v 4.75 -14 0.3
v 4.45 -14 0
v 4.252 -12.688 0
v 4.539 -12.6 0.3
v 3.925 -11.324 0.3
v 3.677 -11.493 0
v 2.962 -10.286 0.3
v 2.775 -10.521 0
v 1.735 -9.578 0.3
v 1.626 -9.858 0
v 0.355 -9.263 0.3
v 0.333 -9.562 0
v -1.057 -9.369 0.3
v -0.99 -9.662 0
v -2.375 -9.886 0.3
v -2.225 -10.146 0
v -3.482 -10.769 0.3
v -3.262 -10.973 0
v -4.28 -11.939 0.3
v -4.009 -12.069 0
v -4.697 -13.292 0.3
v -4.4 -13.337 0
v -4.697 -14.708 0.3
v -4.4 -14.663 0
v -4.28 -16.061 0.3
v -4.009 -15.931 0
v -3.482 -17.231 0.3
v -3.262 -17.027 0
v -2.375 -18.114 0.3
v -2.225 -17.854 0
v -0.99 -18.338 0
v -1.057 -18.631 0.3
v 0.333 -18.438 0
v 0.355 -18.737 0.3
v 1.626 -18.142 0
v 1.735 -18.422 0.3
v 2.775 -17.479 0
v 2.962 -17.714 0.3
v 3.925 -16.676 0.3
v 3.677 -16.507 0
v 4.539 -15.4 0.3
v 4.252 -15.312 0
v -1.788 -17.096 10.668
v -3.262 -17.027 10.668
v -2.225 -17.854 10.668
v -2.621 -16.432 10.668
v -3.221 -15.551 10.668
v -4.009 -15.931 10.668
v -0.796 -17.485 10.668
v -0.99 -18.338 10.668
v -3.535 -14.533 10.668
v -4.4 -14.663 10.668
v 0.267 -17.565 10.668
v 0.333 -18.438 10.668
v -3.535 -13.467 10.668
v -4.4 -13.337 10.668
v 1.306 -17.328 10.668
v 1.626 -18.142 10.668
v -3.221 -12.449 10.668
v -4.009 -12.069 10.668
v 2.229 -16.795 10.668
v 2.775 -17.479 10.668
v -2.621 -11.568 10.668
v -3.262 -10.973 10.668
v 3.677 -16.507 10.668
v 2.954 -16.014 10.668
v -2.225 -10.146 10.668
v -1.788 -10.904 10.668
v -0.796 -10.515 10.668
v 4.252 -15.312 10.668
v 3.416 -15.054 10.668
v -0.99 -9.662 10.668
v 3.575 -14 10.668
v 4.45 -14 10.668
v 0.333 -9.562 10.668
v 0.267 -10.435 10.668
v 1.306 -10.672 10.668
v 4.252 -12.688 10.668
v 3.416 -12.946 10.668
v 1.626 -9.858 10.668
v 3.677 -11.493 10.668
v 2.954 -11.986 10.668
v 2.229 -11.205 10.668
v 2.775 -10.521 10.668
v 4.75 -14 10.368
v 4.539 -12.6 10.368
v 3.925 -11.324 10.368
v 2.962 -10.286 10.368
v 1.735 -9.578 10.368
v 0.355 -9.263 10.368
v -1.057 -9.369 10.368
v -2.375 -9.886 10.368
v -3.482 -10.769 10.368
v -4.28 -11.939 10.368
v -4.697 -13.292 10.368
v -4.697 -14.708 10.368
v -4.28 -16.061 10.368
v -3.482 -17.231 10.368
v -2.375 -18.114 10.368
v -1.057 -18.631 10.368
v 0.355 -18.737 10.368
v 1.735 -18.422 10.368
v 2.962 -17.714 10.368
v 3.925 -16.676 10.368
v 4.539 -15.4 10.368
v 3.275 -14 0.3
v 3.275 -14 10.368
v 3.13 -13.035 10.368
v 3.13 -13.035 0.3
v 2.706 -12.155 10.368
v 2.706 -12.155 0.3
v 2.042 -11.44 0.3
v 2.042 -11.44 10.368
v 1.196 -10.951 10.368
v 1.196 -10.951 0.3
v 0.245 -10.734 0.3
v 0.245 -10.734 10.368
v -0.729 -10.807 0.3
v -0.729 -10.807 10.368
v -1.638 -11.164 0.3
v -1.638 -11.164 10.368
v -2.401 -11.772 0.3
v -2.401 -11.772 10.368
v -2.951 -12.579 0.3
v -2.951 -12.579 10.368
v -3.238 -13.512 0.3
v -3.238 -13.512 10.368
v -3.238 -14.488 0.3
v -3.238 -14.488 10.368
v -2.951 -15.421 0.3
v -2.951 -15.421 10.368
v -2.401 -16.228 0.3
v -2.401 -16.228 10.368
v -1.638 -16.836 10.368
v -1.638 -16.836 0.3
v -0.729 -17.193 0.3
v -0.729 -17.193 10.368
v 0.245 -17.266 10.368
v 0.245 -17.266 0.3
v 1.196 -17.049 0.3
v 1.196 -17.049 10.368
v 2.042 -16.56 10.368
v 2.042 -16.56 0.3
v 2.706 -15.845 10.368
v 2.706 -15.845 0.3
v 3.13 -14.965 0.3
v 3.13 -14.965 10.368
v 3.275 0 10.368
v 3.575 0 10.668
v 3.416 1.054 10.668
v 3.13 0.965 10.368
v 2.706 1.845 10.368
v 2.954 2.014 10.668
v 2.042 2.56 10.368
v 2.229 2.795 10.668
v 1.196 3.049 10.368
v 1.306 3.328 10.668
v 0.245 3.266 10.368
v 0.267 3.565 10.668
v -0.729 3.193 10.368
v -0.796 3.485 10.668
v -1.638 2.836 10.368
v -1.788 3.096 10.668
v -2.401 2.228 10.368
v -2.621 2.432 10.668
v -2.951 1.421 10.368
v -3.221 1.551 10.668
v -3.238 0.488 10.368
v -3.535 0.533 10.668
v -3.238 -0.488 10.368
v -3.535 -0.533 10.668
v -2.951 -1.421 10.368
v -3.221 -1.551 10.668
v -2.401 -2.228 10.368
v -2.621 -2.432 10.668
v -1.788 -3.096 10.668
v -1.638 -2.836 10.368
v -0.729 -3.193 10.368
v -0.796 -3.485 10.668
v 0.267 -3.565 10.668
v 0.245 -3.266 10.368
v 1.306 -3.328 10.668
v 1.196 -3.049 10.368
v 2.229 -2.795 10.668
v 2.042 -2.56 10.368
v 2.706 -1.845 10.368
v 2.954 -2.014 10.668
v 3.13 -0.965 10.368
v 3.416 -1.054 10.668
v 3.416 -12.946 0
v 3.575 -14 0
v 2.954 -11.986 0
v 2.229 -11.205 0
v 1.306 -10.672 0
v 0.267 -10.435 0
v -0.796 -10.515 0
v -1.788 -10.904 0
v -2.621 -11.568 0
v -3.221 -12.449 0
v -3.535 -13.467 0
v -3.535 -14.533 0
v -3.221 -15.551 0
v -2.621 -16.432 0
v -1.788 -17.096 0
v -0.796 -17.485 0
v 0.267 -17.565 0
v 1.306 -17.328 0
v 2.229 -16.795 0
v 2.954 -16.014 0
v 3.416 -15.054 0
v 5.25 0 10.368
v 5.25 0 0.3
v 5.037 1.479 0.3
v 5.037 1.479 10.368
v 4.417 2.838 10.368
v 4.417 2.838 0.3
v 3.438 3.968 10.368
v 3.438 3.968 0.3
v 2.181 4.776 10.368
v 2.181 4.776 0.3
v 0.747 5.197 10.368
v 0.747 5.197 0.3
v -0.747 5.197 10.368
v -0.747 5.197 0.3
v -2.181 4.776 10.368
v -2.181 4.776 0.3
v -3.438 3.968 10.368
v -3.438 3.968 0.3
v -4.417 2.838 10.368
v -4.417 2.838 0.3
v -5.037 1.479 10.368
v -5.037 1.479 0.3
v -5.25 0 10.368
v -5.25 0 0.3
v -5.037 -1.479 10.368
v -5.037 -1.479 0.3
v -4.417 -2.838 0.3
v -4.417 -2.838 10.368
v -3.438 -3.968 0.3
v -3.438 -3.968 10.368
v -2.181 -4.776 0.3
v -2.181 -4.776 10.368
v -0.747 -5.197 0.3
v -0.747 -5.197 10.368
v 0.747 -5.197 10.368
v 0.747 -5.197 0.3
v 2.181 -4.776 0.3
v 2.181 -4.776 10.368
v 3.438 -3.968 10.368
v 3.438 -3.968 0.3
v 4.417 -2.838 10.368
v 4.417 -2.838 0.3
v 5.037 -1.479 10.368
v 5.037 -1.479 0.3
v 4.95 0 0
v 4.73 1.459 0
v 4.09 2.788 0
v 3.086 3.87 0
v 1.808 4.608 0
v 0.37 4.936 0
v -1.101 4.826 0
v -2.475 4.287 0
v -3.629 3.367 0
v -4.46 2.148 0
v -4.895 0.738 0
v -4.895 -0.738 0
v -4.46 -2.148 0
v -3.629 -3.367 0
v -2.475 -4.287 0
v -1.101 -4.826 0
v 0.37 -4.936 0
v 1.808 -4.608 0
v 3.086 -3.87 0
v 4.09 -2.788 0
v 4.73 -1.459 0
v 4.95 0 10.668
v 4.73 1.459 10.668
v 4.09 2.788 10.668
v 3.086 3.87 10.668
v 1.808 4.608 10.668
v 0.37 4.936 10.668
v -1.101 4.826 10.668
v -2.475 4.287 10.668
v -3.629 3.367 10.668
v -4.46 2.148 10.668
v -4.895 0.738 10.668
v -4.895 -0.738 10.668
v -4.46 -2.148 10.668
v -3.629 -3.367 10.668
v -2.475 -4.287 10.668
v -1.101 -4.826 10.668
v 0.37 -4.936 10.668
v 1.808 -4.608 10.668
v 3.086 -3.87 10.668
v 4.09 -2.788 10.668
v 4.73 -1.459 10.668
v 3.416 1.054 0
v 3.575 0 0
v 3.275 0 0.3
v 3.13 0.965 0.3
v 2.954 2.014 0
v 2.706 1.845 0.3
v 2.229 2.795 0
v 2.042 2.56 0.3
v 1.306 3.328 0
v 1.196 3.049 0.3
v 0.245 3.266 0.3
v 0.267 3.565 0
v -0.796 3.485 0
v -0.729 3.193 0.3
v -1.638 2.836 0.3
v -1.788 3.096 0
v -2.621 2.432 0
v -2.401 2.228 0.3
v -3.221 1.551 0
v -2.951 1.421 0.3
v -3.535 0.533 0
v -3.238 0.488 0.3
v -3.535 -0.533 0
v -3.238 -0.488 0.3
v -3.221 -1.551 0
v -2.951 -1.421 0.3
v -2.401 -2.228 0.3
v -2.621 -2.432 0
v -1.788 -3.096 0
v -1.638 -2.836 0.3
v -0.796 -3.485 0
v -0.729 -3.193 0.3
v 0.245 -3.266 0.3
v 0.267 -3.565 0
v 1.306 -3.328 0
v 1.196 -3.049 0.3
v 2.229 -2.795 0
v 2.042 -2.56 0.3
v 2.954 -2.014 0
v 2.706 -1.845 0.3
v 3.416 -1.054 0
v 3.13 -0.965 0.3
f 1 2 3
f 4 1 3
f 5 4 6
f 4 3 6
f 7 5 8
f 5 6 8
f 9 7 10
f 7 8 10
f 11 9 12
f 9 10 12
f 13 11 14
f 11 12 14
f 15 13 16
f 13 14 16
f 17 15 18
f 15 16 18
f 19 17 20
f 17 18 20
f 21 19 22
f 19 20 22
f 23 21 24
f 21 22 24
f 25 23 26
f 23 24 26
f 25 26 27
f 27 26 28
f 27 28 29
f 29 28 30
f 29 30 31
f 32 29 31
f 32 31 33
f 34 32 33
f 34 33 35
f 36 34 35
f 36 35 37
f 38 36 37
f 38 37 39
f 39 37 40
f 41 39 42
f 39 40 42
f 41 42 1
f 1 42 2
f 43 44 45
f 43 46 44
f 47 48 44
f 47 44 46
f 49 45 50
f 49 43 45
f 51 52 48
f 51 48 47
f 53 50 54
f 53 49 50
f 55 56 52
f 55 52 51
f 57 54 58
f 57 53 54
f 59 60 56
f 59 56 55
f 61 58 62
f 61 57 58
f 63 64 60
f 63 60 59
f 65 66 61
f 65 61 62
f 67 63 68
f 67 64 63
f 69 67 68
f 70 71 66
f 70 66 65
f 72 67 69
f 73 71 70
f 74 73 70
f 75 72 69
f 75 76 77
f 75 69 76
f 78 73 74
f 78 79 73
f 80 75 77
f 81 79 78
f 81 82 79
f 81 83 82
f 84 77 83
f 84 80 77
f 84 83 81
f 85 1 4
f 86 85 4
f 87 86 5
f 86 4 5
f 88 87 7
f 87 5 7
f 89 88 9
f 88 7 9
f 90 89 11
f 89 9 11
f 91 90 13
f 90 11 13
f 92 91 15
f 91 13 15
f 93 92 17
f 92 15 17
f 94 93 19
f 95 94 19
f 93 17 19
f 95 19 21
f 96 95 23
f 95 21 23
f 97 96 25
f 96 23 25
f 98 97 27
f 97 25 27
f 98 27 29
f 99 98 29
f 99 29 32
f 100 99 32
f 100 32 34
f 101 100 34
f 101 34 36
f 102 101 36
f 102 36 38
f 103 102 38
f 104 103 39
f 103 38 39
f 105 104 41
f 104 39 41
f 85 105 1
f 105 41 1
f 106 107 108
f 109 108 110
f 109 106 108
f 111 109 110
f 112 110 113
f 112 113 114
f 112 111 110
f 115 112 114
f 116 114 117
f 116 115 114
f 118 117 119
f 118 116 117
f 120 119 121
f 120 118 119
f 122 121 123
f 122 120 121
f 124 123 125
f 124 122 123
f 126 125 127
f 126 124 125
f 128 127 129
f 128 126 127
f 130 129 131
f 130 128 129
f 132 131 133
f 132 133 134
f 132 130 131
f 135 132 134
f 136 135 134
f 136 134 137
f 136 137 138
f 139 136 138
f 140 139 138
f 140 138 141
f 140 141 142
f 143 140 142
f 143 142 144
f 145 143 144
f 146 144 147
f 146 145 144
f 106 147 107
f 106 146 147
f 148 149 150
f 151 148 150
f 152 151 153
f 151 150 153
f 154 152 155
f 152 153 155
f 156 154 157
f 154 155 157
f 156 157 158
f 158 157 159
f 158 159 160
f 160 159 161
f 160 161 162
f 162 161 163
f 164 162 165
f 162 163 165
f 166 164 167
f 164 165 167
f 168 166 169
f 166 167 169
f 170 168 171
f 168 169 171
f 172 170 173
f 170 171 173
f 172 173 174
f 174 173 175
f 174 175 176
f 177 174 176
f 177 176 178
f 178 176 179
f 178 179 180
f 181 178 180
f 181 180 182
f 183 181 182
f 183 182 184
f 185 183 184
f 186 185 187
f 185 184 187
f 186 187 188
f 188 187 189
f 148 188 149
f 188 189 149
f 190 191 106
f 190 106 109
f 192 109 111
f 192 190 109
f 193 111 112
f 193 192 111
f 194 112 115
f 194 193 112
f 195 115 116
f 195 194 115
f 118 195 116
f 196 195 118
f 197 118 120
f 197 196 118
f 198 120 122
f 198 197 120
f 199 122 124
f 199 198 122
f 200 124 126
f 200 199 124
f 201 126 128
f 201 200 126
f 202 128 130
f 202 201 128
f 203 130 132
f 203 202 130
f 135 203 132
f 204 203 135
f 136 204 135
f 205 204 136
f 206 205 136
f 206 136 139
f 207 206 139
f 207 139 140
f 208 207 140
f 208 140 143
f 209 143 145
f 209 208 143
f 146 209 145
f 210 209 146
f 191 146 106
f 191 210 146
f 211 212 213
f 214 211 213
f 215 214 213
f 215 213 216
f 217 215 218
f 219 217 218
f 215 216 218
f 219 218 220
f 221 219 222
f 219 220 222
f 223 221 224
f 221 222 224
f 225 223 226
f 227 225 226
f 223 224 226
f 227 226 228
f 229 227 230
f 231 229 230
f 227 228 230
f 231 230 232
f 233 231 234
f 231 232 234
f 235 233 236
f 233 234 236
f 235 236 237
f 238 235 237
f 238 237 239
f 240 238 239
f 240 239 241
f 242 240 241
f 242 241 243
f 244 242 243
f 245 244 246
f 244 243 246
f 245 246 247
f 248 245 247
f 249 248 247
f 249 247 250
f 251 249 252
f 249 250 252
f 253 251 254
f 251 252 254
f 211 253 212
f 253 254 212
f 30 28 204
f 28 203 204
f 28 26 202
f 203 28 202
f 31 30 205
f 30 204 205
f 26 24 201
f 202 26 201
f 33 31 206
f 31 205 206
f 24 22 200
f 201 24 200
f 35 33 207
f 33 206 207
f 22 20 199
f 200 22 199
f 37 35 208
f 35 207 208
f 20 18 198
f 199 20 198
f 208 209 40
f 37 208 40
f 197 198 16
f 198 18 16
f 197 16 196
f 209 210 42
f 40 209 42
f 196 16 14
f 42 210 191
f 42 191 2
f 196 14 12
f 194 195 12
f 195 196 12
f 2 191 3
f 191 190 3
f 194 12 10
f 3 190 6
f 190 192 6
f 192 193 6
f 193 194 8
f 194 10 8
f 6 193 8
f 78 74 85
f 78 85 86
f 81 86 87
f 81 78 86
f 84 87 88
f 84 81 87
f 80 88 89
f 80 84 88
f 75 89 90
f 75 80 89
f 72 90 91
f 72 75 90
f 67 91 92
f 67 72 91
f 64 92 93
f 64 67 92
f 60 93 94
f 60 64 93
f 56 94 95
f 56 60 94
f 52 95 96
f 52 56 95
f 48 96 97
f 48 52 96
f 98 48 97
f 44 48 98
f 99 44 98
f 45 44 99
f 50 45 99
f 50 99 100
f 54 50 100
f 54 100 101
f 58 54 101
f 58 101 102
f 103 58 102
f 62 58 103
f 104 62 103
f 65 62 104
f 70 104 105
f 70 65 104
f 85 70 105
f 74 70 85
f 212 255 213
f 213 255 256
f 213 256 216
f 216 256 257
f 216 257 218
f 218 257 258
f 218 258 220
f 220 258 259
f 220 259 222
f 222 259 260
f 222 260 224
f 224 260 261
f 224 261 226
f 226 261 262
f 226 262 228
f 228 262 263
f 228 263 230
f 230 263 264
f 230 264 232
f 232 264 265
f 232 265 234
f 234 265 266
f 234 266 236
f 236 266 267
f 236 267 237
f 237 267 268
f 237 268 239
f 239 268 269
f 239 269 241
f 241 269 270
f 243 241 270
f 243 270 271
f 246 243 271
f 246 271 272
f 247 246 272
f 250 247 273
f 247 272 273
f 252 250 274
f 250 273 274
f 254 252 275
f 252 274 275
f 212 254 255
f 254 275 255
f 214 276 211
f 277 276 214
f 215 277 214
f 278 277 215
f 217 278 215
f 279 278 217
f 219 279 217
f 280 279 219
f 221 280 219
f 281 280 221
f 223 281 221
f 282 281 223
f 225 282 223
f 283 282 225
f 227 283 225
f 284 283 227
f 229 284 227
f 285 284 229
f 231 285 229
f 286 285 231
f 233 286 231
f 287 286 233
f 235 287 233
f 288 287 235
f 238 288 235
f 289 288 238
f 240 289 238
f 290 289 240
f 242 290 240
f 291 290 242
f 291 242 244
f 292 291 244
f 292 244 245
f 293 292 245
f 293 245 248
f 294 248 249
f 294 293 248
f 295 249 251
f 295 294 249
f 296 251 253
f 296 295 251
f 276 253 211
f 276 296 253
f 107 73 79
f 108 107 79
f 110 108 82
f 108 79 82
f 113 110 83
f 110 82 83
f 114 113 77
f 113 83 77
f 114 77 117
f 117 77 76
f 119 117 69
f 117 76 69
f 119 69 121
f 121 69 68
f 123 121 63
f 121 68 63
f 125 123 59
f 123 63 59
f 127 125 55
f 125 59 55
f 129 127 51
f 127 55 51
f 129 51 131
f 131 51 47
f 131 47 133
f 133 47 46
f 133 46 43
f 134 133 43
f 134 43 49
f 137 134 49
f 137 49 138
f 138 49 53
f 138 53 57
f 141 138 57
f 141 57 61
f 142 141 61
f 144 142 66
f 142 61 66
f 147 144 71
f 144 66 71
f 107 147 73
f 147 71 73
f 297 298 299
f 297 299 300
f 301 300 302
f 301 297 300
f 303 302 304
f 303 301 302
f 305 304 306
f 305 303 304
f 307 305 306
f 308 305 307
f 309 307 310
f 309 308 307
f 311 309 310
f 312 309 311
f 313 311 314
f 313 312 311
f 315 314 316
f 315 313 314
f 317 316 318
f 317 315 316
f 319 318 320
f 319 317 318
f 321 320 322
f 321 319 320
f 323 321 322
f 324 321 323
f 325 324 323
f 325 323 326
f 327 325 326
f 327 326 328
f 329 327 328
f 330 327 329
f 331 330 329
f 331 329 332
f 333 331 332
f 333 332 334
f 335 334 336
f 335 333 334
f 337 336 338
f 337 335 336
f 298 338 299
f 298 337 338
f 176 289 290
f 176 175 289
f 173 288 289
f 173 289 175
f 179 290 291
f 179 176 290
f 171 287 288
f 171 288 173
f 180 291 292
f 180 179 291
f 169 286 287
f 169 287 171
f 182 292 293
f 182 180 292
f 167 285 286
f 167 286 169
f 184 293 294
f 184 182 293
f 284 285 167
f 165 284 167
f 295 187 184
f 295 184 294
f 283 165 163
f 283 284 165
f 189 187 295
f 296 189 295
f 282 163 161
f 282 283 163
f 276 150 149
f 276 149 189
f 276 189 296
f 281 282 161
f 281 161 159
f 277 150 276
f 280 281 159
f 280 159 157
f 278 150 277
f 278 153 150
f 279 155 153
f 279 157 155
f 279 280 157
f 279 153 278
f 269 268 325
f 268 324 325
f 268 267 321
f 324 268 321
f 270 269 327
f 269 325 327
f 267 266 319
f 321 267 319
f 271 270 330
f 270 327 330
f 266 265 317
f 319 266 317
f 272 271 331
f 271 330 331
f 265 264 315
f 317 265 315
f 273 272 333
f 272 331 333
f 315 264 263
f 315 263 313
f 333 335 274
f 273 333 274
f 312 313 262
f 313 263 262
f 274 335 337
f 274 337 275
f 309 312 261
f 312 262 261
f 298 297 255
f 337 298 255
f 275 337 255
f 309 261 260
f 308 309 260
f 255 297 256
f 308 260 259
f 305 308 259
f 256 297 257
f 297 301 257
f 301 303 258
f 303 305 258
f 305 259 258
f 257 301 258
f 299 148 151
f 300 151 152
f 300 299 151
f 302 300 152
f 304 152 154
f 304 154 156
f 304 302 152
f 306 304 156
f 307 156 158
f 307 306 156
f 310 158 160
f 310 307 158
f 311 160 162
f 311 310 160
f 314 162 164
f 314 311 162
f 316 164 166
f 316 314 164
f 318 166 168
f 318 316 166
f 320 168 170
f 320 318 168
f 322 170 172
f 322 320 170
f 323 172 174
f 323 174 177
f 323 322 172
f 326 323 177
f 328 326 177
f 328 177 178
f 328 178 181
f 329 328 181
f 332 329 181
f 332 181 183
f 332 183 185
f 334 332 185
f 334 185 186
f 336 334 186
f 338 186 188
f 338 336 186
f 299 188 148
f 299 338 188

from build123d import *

# Parameters (mm, degrees)
F0_R      = 4.75
F0_R_2    = 3.275
F1_DEPTH  = 10.668
F0_R_3    = 5.25
F2_SIZE   = 0.3
F2_2_SIZE = 0.3


with BuildPart() as f1:
    # F0 (on Top) → F1 (new body)
    with BuildSketch(Plane.XY):
        with Locations((0, -14)):
            Circle(F0_R)
        with Locations((0, -14)):
            Circle(F0_R_2, mode=Mode.SUBTRACT)
    extrude(amount=F1_DEPTH)

    # F2
    f2_edges = [f1.edges().sort_by_distance(p)[0] for p in [
        (-3.275, -14, 10.668),
        (-3.275, -14, 0),
        (-4.75, -14, 0),
        (-4.75, -14, 10.668),
    ]]
    chamfer(f2_edges, length=F2_SIZE)


with BuildPart() as f1b:
    # F0 (on Top) → F1, piece 2 (new body)
    with BuildSketch(Plane.XY):
        Circle(F0_R_3)
        Circle(F0_R_2, mode=Mode.SUBTRACT)
    extrude(amount=F1_DEPTH)

    # F2#2
    f2_2_edges = [f1b.edges().sort_by_distance(p)[0] for p in [
        (-3.275, 0, 10.668),
        (-3.275, 0, 0),
        (-5.25, 0, 0),
        (-5.25, 0, 10.668),
    ]]
    chamfer(f2_2_edges, length=F2_2_SIZE)


solid = Compound([f1.part, f1b.part])
